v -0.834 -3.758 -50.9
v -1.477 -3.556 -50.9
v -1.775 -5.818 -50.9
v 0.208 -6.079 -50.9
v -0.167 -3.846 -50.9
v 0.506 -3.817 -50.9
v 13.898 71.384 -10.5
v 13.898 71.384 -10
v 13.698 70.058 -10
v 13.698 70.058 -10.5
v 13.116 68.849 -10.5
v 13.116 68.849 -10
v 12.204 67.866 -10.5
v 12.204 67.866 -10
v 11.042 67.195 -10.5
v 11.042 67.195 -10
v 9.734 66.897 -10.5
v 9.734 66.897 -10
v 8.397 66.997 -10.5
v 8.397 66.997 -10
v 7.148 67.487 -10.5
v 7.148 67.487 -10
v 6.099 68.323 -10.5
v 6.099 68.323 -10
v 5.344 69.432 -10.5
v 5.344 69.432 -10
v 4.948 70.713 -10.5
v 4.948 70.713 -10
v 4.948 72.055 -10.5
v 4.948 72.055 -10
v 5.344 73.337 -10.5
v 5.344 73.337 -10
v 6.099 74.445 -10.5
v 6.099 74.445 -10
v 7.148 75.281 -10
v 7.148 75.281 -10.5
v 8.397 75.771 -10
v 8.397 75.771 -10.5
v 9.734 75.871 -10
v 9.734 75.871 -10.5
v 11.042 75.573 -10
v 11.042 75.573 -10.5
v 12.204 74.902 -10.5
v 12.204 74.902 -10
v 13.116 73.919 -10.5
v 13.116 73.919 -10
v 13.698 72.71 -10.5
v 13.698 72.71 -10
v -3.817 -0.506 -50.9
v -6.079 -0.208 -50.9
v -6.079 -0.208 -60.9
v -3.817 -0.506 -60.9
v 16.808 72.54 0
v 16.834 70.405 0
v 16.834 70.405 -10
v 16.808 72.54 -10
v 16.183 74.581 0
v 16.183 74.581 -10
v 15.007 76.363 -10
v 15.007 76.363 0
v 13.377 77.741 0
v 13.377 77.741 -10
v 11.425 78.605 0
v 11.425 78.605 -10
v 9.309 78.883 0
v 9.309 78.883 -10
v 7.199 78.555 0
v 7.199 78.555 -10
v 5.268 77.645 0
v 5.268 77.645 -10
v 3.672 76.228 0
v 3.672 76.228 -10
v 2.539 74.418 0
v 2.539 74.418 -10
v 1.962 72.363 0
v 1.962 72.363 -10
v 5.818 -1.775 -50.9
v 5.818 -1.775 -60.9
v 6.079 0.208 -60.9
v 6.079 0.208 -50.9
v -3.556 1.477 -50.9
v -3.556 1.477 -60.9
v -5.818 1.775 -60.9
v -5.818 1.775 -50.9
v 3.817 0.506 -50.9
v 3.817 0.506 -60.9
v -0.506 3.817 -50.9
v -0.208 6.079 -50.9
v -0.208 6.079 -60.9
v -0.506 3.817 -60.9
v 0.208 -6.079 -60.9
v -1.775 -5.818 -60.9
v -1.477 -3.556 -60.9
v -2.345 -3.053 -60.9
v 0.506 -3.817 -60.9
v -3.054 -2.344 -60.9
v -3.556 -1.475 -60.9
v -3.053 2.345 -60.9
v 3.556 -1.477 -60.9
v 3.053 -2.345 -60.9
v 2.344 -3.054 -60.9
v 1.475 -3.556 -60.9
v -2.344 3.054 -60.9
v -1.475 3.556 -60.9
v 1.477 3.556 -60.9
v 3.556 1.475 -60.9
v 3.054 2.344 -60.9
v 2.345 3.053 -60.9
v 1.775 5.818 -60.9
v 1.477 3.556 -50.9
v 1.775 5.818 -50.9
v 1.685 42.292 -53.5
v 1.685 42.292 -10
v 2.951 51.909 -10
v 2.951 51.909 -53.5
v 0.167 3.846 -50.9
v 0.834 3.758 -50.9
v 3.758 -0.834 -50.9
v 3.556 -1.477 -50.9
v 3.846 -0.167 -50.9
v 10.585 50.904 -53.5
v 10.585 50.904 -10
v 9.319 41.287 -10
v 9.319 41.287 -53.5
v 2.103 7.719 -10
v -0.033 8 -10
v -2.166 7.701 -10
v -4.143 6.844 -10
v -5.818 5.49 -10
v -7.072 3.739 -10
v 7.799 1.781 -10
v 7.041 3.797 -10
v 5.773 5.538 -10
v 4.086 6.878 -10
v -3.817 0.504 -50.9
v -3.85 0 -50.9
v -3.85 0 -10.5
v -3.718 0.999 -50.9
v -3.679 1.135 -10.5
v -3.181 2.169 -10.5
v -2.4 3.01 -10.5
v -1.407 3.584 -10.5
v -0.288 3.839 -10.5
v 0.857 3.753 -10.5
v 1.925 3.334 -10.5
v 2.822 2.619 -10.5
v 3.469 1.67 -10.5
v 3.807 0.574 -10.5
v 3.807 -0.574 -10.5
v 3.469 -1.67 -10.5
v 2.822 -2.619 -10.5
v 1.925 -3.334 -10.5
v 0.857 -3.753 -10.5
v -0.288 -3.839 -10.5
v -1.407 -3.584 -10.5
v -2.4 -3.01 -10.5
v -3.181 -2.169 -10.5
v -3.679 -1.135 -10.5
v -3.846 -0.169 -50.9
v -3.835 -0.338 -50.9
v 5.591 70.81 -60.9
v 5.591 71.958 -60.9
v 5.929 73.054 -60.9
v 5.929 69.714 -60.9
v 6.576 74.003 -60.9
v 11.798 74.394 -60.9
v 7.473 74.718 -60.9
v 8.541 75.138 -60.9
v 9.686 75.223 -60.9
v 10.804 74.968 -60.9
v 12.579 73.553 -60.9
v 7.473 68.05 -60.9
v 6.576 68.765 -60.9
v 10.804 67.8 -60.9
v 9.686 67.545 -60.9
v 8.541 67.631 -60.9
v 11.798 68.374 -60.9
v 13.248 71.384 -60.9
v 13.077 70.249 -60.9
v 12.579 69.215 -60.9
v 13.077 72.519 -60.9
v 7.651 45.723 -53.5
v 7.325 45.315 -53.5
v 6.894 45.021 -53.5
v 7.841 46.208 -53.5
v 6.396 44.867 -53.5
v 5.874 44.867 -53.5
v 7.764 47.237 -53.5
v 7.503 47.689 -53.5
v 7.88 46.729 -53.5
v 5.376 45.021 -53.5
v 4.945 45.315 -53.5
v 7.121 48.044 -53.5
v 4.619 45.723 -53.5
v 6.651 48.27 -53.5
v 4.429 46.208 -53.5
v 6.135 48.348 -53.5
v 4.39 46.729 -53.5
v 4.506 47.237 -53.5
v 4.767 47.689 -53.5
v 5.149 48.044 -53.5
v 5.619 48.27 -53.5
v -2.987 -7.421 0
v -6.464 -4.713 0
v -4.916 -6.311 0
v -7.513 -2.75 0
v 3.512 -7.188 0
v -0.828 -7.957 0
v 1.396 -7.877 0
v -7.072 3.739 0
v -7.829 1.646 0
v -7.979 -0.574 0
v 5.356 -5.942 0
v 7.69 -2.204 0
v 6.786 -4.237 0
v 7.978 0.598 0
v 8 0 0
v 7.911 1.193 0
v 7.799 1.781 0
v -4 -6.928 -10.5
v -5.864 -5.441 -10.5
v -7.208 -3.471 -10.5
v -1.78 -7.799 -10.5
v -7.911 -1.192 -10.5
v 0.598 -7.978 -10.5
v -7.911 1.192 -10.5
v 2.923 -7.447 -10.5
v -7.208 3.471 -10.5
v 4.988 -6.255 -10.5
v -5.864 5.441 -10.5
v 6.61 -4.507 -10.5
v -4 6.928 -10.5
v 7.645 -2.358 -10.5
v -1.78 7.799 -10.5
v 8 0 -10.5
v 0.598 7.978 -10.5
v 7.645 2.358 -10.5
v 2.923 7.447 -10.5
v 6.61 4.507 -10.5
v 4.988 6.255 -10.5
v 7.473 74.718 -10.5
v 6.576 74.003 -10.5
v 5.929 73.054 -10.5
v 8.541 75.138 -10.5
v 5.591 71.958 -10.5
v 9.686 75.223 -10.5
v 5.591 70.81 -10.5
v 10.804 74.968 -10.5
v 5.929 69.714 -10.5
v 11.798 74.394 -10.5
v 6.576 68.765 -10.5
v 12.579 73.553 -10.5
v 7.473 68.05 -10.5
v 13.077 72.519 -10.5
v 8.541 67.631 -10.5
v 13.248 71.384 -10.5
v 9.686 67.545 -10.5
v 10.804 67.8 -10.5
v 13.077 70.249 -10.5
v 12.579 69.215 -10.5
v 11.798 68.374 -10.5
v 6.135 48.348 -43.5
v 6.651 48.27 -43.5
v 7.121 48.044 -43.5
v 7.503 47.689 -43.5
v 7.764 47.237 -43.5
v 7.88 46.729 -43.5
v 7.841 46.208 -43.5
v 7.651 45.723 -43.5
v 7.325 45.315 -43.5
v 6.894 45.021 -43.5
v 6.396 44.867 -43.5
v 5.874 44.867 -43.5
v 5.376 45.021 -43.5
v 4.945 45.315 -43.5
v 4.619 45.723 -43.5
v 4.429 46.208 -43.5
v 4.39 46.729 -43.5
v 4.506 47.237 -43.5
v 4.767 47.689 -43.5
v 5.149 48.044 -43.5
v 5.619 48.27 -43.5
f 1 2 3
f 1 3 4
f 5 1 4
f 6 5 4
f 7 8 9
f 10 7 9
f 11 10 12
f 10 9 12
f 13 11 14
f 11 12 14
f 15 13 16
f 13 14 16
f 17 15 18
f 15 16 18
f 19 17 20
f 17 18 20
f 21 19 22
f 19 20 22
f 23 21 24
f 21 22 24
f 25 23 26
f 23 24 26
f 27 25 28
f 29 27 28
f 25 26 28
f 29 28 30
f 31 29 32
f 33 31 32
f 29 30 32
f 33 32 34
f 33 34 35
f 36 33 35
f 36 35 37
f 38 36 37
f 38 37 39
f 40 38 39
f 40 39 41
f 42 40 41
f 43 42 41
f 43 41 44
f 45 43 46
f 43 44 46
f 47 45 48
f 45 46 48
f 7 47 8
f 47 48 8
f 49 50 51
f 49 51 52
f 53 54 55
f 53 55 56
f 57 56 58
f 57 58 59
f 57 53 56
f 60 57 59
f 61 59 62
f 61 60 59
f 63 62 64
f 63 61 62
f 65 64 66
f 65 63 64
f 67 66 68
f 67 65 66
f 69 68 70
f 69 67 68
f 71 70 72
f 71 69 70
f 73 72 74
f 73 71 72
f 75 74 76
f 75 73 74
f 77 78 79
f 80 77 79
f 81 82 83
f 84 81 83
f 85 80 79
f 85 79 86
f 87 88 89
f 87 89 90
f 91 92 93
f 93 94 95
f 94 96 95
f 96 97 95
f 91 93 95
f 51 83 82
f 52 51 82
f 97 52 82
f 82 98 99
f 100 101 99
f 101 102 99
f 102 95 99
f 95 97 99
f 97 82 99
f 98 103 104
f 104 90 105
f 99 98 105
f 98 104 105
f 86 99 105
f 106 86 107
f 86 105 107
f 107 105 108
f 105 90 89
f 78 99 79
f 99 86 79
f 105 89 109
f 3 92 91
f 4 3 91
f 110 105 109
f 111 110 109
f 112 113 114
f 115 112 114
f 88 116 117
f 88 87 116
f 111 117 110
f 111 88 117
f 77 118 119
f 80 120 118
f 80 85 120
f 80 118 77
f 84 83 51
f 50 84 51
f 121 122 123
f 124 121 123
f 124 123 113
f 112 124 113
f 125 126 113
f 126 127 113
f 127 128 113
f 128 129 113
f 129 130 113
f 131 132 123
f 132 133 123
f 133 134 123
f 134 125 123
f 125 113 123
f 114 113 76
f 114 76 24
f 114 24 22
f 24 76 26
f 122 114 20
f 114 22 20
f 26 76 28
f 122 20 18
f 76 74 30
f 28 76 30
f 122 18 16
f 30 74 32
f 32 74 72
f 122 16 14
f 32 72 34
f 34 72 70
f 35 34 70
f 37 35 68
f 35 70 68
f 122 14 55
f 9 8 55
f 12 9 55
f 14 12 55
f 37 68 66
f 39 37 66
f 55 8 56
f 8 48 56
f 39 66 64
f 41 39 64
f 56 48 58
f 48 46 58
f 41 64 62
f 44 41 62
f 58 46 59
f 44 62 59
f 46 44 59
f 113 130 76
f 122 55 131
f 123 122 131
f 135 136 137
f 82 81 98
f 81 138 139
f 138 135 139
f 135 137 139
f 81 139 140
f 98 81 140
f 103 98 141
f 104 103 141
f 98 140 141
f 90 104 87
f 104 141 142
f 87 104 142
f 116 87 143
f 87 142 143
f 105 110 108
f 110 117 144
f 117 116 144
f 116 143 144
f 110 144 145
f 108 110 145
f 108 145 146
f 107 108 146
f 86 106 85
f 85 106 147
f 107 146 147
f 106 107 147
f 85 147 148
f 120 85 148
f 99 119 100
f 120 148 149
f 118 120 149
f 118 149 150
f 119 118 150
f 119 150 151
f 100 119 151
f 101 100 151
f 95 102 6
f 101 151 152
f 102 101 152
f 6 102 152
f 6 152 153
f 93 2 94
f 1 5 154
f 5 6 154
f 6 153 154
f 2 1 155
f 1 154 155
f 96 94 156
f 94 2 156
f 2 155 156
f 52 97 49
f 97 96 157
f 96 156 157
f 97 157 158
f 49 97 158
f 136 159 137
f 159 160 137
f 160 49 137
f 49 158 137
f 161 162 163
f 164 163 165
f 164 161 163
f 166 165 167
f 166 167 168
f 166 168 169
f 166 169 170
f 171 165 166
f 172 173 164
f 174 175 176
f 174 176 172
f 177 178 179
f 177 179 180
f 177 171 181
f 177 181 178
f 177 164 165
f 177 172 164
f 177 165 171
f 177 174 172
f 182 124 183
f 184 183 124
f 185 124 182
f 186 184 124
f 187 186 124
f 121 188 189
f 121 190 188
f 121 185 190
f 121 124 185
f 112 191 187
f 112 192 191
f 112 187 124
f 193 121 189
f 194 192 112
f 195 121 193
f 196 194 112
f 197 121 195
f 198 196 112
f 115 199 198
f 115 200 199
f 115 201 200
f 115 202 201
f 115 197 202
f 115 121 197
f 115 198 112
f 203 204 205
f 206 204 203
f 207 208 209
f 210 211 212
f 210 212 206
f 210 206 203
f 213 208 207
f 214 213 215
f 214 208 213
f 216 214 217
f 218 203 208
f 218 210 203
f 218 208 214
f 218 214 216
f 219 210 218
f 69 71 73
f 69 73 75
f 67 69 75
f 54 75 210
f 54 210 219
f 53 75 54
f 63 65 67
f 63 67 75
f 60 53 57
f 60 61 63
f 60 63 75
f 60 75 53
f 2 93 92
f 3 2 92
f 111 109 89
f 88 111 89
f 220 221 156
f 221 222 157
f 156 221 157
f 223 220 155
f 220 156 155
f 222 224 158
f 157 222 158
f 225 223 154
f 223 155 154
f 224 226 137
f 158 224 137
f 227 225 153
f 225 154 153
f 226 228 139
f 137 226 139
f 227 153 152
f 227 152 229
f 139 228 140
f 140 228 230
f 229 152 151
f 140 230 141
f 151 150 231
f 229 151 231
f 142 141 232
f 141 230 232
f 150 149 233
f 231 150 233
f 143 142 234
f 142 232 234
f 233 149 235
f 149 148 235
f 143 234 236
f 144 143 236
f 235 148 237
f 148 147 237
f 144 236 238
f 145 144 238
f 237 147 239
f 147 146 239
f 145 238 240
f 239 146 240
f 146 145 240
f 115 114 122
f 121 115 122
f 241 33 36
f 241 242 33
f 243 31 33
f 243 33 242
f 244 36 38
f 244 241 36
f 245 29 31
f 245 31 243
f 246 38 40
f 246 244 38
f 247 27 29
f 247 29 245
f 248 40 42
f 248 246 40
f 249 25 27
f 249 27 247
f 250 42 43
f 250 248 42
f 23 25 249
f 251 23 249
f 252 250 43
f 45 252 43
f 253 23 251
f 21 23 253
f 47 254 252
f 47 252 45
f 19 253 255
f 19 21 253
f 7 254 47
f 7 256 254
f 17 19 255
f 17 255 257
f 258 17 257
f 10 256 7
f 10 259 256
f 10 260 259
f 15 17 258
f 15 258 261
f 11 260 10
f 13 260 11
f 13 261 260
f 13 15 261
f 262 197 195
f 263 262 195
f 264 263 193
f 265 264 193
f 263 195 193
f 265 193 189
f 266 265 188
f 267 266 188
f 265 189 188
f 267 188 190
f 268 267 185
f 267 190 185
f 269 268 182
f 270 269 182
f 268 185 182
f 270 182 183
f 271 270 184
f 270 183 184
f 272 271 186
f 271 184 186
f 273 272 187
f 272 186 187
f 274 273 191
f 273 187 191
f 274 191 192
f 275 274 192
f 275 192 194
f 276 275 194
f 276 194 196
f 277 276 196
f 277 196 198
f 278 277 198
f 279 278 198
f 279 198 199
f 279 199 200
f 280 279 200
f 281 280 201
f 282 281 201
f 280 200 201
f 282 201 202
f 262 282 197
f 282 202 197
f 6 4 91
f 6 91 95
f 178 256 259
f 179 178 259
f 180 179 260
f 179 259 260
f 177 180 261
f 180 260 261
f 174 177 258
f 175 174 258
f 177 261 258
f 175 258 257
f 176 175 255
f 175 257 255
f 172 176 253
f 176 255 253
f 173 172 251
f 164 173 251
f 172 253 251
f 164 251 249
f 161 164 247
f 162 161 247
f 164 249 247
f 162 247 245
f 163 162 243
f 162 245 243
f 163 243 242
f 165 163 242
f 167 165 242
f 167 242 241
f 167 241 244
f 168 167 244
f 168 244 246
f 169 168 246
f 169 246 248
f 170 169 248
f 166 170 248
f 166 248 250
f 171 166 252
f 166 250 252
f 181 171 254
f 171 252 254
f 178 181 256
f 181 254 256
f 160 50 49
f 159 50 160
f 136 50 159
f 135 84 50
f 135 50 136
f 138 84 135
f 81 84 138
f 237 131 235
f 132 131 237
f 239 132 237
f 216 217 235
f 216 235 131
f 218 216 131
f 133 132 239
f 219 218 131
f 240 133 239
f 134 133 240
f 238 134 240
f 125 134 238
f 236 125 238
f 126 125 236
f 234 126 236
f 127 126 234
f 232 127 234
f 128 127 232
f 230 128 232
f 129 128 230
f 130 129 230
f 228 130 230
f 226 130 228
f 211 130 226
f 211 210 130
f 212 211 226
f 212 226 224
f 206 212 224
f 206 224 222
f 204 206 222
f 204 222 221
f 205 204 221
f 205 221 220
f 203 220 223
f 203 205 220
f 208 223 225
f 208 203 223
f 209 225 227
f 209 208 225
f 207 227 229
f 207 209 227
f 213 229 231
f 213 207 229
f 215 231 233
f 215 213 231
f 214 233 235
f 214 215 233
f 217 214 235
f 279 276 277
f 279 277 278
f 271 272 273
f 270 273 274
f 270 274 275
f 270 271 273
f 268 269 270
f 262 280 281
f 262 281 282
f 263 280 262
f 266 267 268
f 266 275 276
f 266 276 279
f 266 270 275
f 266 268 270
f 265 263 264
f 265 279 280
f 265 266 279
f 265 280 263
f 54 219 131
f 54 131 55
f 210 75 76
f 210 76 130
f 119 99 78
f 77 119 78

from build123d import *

# Parameters (mm, degrees)
SKETCH1_R           = 8
BOSS_EXTRUDE1_DEPTH = 10.5
SKETCH2_R           = 3.85
BOSS_EXTRUDE2_DEPTH = 60
BOSS_EXTRUDE3_START = -9.6
BOSS_EXTRUDE3_DEPTH = 10
CUT_EXTRUDE1_START  = -9.6
SKETCH6_R           = 3.85
CUT_EXTRUDE1_DEPTH  = 9.6
BOSS_EXTRUDE4_DEPTH = 10
SKETCH8_R           = 4.5
BOSS_EXTRUDE5_DEPTH = 0.5
SKETCH9_R           = 3.85
BOSS_EXTRUDE6_DEPTH = 50.4
BOSS_EXTRUDE7_DEPTH = 43.5
SKETCH12_R          = 1.75
CUT_EXTRUDE2_DEPTH  = 10


with BuildPart() as part:
    # Sketch1 → Boss-Extrude1 (new body)
    with BuildSketch(Plane.XY):
        Circle(SKETCH1_R)
    extrude(amount=-BOSS_EXTRUDE1_DEPTH)

    # Sketch2 → Boss-Extrude2 (add)
    with BuildSketch(Plane(origin=(0, 0, -10.5), x_dir=(-1, 0, 0), z_dir=(0, 0, -1))):
        Circle(SKETCH2_R)
    extrude(amount=BOSS_EXTRUDE2_DEPTH)

    # Sketch3 → Boss-Extrude3 (add)
    with BuildSketch(Plane(origin=(0, 0, -70.5), x_dir=(-1, 0, 0), z_dir=(0, 0, -1)).offset(BOSS_EXTRUDE3_START)):
        Polygon((-6.07919536, 0.208287708), (-1.121971054, 0.860918669), (-1.774602015, 5.818142976), (0.208287708, 6.07919536), (0.860918669, 1.121971054), (5.818142976, 1.774602015), (6.07919536, -0.208287708), (1.121971054, -0.860918669), (1.774602015, -5.818142976), (-0.208287708, -6.07919536), (-0.860918669, -1.121971054), (-5.818142976, -1.774602015), align=None)
    extrude(amount=-BOSS_EXTRUDE3_DEPTH)

    # Sketch6 → Cut-Extrude1 (cut)
    with BuildSketch(Plane(origin=(0, 0, -70.5), x_dir=(-1, 0, 0), z_dir=(0, 0, -1)).offset(CUT_EXTRUDE1_START)):
        with Locations(Location((0, 0, 0), (0, 0, 172.44534936))):
            Circle(SKETCH6_R)
    extrude(amount=CUT_EXTRUDE1_DEPTH, mode=Mode.SUBTRACT)

    # Sketch7 → Boss-Extrude4 (add)
    with BuildSketch(Plane.XY):
        with BuildLine():
            Line((1.96204938, 72.362976461), (-7.07246692, 3.739012125))
            Line((-7.07246692, 3.739012125), (7.799206001, 1.781119242))
            Line((7.799206001, 1.781119242), (16.8337223, 70.405083577))
            ThreePointArc((16.8337223, 70.405083577), (10.376832281, 78.819866479), (1.96204938, 72.362976461))
        make_face()
    extrude(amount=-BOSS_EXTRUDE4_DEPTH)

    # Sketch8 → Boss-Extrude5 (add)
    with BuildSketch(Plane(origin=(0, 0, -10), x_dir=(-1, 0, 0), z_dir=(0, 0, -1))):
        with Locations(Location((-9.39788584, 71.384030019, 0), (0, 0, 180))):
            Circle(SKETCH8_R)
    extrude(amount=BOSS_EXTRUDE5_DEPTH)

    # Sketch9 → Boss-Extrude6 (add)
    with BuildSketch(Plane(origin=(0, 0, -10.5), x_dir=(-1, 0, 0), z_dir=(0, 0, -1))):
        with Locations(Location((-9.39788584, 71.384030019, 0), (0, 0, 180))):
            Circle(SKETCH9_R)
    extrude(amount=BOSS_EXTRUDE6_DEPTH)

    # Sketch11 → Boss-Extrude7 (add)
    with BuildSketch(Plane(origin=(0, 0, -10), x_dir=(-1, 0, 0), z_dir=(0, 0, -1))):
        Polygon((-2.951315217, 51.908863587), (-10.584845783, 50.903890222), (-9.318741718, 41.286875067), (-1.685211153, 42.291848431), align=None)
    extrude(amount=BOSS_EXTRUDE7_DEPTH)

    # Sketch12 → Cut-Extrude2 (cut)
    with BuildSketch(Plane(origin=(0, 0, -53.5), x_dir=(-1, 0, 0), z_dir=(0, 0, -1))):
        with Locations(Location((-6.135028468, 46.597869327, 0), (0, 0, 90))):
            Circle(SKETCH12_R)
    extrude(amount=-CUT_EXTRUDE2_DEPTH, mode=Mode.SUBTRACT)


solid = part.part
